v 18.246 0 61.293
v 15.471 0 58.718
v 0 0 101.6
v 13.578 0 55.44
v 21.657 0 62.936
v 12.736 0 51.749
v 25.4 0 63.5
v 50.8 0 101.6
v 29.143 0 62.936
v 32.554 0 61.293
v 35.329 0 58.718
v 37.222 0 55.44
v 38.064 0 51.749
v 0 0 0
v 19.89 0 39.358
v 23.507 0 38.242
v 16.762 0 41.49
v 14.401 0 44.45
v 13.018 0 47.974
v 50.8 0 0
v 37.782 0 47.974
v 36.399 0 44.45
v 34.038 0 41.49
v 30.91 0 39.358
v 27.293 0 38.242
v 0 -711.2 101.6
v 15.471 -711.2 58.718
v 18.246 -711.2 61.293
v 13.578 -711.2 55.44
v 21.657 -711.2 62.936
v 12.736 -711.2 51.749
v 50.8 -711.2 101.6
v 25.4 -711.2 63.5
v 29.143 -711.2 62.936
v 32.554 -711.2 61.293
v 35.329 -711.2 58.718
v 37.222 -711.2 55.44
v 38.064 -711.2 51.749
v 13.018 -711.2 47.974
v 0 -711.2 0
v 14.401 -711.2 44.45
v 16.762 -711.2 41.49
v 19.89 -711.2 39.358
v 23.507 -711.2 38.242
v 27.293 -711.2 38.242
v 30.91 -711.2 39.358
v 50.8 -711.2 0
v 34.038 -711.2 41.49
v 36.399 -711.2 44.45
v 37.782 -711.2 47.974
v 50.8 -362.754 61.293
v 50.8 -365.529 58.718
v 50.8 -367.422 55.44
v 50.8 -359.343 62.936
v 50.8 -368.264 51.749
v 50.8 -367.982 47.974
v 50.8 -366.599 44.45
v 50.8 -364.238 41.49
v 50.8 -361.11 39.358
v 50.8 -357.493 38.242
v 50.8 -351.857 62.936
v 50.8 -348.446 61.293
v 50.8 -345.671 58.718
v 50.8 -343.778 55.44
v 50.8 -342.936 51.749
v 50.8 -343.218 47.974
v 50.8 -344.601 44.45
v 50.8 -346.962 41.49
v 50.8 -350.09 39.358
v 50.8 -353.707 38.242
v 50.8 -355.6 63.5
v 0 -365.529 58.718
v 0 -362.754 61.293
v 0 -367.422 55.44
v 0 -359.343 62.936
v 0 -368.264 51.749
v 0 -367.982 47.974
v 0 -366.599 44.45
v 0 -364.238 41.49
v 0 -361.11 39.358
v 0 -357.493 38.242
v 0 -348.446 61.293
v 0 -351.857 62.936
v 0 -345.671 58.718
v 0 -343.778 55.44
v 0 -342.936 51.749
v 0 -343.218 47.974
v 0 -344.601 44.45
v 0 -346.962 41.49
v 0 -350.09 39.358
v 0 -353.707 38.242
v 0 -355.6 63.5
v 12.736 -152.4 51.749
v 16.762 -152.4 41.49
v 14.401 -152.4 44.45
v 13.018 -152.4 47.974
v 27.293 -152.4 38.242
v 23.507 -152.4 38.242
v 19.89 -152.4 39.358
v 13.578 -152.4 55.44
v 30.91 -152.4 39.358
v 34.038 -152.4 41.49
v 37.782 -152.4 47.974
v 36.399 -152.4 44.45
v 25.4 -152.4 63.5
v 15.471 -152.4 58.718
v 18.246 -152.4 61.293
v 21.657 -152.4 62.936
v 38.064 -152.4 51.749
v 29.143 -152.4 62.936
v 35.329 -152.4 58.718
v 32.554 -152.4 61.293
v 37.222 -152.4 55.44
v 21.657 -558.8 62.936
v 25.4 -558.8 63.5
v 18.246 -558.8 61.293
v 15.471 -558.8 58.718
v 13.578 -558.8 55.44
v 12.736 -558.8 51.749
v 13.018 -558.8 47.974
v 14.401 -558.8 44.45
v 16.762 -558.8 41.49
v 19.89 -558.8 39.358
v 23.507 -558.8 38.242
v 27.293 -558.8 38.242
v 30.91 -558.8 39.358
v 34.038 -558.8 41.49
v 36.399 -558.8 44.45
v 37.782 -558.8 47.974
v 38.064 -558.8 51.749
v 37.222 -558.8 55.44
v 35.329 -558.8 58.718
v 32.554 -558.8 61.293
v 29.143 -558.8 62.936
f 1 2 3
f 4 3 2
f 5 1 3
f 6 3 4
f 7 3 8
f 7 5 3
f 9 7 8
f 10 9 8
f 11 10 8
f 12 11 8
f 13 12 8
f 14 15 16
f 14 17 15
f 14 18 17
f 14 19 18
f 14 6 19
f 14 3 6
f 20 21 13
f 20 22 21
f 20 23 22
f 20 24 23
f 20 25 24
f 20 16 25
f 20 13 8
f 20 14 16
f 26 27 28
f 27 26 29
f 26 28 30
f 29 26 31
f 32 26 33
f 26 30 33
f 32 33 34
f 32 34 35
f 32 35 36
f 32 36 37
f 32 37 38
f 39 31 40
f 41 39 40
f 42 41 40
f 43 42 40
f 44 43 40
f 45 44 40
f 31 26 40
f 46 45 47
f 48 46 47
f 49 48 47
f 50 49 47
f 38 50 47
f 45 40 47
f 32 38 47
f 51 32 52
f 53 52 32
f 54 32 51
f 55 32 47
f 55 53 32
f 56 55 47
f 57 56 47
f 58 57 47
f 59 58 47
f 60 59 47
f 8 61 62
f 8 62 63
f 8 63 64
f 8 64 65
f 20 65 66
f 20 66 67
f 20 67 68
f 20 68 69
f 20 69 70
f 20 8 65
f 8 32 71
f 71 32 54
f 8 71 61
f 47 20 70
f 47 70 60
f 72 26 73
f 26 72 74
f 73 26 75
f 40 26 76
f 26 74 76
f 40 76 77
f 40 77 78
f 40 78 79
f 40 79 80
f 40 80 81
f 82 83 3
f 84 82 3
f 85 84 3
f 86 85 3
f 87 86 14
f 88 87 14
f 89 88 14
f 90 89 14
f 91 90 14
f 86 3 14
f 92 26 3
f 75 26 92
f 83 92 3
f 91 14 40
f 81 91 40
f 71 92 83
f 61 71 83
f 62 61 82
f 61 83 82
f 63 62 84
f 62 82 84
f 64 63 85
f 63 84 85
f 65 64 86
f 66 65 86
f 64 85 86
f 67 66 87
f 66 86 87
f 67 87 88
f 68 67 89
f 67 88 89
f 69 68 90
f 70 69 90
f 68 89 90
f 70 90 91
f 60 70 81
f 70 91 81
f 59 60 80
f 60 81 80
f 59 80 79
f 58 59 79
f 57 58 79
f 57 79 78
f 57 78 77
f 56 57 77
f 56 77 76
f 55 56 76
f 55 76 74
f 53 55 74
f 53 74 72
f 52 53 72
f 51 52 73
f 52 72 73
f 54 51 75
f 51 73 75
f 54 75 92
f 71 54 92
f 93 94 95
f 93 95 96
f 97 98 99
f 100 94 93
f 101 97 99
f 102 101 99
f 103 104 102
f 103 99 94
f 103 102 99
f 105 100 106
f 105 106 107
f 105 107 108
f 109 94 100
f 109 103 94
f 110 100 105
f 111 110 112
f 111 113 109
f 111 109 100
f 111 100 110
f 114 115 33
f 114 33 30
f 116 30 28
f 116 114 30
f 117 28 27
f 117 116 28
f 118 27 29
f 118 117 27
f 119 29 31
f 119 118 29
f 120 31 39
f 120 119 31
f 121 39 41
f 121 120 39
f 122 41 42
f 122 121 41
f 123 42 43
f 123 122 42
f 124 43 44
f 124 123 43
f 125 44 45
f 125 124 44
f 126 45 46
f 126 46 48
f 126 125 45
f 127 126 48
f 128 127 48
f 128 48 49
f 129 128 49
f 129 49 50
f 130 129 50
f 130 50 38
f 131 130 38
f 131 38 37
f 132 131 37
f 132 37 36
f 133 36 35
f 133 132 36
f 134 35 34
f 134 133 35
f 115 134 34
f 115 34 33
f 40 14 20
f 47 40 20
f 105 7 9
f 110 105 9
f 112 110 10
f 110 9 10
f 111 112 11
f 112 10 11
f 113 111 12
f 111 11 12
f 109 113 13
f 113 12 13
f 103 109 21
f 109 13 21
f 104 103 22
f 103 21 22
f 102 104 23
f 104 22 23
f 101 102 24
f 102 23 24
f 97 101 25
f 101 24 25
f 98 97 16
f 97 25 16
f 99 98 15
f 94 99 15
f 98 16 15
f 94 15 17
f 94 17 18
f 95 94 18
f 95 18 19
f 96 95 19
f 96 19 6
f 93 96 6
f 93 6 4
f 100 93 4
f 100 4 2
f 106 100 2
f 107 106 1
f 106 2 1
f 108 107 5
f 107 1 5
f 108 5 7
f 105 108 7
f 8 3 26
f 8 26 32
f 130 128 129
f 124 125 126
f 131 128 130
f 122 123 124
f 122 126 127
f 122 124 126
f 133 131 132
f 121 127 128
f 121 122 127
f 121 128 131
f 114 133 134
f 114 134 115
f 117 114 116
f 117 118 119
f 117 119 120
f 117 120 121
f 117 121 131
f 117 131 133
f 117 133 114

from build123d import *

# Parameters (mm, degrees)
SKETCH1_W           = 50.8
SKETCH1_H           = 101.6
BOSS_EXTRUDE1_DEPTH = 711.2
SKETCH2_R           = 12.7
CUT_EXTRUDE1_DEPTH  = 50.8
SKETCH3_R           = 12.7
CUT_EXTRUDE2_DEPTH  = 152.4
CUT_EXTRUDE3_START  = -152.4
SKETCH4_R           = 12.7
CUT_EXTRUDE3_DEPTH  = 152.4


with BuildPart() as part:
    # Sketch1 → Boss-Extrude1 (new body)
    with BuildSketch(Plane(origin=(0, 0, 0), x_dir=(1, 0, 0), z_dir=(0, 1, 0))):
        with Locations((25.4, -50.8)):
            Rectangle(SKETCH1_W, SKETCH1_H)
    extrude(amount=-BOSS_EXTRUDE1_DEPTH)

    # Sketch2 → Cut-Extrude1 (cut)
    with BuildSketch(Plane.ZY):
        with Locations((50.8, -355.6)):
            Circle(SKETCH2_R)
    extrude(amount=-CUT_EXTRUDE1_DEPTH, mode=Mode.SUBTRACT)

    # Sketch3 → Cut-Extrude2 (cut)
    with BuildSketch(Plane(origin=(0, 0, 0), x_dir=(1, 0, 0), z_dir=(0, 1, 0))):
        with Locations(Location((25.4, -50.8, 0), (0, 0, 270))):
            Circle(SKETCH3_R)
    extrude(amount=-CUT_EXTRUDE2_DEPTH, mode=Mode.SUBTRACT)

    # Sketch4 → Cut-Extrude3 (cut)
    with BuildSketch(Plane.XZ.offset(711.2).offset(CUT_EXTRUDE3_START)):
        with Locations(Location((25.4, 50.8, 0), (0, 0, 90))):
            Circle(SKETCH4_R)
    extrude(amount=CUT_EXTRUDE3_DEPTH, mode=Mode.SUBTRACT)


solid = part.part
